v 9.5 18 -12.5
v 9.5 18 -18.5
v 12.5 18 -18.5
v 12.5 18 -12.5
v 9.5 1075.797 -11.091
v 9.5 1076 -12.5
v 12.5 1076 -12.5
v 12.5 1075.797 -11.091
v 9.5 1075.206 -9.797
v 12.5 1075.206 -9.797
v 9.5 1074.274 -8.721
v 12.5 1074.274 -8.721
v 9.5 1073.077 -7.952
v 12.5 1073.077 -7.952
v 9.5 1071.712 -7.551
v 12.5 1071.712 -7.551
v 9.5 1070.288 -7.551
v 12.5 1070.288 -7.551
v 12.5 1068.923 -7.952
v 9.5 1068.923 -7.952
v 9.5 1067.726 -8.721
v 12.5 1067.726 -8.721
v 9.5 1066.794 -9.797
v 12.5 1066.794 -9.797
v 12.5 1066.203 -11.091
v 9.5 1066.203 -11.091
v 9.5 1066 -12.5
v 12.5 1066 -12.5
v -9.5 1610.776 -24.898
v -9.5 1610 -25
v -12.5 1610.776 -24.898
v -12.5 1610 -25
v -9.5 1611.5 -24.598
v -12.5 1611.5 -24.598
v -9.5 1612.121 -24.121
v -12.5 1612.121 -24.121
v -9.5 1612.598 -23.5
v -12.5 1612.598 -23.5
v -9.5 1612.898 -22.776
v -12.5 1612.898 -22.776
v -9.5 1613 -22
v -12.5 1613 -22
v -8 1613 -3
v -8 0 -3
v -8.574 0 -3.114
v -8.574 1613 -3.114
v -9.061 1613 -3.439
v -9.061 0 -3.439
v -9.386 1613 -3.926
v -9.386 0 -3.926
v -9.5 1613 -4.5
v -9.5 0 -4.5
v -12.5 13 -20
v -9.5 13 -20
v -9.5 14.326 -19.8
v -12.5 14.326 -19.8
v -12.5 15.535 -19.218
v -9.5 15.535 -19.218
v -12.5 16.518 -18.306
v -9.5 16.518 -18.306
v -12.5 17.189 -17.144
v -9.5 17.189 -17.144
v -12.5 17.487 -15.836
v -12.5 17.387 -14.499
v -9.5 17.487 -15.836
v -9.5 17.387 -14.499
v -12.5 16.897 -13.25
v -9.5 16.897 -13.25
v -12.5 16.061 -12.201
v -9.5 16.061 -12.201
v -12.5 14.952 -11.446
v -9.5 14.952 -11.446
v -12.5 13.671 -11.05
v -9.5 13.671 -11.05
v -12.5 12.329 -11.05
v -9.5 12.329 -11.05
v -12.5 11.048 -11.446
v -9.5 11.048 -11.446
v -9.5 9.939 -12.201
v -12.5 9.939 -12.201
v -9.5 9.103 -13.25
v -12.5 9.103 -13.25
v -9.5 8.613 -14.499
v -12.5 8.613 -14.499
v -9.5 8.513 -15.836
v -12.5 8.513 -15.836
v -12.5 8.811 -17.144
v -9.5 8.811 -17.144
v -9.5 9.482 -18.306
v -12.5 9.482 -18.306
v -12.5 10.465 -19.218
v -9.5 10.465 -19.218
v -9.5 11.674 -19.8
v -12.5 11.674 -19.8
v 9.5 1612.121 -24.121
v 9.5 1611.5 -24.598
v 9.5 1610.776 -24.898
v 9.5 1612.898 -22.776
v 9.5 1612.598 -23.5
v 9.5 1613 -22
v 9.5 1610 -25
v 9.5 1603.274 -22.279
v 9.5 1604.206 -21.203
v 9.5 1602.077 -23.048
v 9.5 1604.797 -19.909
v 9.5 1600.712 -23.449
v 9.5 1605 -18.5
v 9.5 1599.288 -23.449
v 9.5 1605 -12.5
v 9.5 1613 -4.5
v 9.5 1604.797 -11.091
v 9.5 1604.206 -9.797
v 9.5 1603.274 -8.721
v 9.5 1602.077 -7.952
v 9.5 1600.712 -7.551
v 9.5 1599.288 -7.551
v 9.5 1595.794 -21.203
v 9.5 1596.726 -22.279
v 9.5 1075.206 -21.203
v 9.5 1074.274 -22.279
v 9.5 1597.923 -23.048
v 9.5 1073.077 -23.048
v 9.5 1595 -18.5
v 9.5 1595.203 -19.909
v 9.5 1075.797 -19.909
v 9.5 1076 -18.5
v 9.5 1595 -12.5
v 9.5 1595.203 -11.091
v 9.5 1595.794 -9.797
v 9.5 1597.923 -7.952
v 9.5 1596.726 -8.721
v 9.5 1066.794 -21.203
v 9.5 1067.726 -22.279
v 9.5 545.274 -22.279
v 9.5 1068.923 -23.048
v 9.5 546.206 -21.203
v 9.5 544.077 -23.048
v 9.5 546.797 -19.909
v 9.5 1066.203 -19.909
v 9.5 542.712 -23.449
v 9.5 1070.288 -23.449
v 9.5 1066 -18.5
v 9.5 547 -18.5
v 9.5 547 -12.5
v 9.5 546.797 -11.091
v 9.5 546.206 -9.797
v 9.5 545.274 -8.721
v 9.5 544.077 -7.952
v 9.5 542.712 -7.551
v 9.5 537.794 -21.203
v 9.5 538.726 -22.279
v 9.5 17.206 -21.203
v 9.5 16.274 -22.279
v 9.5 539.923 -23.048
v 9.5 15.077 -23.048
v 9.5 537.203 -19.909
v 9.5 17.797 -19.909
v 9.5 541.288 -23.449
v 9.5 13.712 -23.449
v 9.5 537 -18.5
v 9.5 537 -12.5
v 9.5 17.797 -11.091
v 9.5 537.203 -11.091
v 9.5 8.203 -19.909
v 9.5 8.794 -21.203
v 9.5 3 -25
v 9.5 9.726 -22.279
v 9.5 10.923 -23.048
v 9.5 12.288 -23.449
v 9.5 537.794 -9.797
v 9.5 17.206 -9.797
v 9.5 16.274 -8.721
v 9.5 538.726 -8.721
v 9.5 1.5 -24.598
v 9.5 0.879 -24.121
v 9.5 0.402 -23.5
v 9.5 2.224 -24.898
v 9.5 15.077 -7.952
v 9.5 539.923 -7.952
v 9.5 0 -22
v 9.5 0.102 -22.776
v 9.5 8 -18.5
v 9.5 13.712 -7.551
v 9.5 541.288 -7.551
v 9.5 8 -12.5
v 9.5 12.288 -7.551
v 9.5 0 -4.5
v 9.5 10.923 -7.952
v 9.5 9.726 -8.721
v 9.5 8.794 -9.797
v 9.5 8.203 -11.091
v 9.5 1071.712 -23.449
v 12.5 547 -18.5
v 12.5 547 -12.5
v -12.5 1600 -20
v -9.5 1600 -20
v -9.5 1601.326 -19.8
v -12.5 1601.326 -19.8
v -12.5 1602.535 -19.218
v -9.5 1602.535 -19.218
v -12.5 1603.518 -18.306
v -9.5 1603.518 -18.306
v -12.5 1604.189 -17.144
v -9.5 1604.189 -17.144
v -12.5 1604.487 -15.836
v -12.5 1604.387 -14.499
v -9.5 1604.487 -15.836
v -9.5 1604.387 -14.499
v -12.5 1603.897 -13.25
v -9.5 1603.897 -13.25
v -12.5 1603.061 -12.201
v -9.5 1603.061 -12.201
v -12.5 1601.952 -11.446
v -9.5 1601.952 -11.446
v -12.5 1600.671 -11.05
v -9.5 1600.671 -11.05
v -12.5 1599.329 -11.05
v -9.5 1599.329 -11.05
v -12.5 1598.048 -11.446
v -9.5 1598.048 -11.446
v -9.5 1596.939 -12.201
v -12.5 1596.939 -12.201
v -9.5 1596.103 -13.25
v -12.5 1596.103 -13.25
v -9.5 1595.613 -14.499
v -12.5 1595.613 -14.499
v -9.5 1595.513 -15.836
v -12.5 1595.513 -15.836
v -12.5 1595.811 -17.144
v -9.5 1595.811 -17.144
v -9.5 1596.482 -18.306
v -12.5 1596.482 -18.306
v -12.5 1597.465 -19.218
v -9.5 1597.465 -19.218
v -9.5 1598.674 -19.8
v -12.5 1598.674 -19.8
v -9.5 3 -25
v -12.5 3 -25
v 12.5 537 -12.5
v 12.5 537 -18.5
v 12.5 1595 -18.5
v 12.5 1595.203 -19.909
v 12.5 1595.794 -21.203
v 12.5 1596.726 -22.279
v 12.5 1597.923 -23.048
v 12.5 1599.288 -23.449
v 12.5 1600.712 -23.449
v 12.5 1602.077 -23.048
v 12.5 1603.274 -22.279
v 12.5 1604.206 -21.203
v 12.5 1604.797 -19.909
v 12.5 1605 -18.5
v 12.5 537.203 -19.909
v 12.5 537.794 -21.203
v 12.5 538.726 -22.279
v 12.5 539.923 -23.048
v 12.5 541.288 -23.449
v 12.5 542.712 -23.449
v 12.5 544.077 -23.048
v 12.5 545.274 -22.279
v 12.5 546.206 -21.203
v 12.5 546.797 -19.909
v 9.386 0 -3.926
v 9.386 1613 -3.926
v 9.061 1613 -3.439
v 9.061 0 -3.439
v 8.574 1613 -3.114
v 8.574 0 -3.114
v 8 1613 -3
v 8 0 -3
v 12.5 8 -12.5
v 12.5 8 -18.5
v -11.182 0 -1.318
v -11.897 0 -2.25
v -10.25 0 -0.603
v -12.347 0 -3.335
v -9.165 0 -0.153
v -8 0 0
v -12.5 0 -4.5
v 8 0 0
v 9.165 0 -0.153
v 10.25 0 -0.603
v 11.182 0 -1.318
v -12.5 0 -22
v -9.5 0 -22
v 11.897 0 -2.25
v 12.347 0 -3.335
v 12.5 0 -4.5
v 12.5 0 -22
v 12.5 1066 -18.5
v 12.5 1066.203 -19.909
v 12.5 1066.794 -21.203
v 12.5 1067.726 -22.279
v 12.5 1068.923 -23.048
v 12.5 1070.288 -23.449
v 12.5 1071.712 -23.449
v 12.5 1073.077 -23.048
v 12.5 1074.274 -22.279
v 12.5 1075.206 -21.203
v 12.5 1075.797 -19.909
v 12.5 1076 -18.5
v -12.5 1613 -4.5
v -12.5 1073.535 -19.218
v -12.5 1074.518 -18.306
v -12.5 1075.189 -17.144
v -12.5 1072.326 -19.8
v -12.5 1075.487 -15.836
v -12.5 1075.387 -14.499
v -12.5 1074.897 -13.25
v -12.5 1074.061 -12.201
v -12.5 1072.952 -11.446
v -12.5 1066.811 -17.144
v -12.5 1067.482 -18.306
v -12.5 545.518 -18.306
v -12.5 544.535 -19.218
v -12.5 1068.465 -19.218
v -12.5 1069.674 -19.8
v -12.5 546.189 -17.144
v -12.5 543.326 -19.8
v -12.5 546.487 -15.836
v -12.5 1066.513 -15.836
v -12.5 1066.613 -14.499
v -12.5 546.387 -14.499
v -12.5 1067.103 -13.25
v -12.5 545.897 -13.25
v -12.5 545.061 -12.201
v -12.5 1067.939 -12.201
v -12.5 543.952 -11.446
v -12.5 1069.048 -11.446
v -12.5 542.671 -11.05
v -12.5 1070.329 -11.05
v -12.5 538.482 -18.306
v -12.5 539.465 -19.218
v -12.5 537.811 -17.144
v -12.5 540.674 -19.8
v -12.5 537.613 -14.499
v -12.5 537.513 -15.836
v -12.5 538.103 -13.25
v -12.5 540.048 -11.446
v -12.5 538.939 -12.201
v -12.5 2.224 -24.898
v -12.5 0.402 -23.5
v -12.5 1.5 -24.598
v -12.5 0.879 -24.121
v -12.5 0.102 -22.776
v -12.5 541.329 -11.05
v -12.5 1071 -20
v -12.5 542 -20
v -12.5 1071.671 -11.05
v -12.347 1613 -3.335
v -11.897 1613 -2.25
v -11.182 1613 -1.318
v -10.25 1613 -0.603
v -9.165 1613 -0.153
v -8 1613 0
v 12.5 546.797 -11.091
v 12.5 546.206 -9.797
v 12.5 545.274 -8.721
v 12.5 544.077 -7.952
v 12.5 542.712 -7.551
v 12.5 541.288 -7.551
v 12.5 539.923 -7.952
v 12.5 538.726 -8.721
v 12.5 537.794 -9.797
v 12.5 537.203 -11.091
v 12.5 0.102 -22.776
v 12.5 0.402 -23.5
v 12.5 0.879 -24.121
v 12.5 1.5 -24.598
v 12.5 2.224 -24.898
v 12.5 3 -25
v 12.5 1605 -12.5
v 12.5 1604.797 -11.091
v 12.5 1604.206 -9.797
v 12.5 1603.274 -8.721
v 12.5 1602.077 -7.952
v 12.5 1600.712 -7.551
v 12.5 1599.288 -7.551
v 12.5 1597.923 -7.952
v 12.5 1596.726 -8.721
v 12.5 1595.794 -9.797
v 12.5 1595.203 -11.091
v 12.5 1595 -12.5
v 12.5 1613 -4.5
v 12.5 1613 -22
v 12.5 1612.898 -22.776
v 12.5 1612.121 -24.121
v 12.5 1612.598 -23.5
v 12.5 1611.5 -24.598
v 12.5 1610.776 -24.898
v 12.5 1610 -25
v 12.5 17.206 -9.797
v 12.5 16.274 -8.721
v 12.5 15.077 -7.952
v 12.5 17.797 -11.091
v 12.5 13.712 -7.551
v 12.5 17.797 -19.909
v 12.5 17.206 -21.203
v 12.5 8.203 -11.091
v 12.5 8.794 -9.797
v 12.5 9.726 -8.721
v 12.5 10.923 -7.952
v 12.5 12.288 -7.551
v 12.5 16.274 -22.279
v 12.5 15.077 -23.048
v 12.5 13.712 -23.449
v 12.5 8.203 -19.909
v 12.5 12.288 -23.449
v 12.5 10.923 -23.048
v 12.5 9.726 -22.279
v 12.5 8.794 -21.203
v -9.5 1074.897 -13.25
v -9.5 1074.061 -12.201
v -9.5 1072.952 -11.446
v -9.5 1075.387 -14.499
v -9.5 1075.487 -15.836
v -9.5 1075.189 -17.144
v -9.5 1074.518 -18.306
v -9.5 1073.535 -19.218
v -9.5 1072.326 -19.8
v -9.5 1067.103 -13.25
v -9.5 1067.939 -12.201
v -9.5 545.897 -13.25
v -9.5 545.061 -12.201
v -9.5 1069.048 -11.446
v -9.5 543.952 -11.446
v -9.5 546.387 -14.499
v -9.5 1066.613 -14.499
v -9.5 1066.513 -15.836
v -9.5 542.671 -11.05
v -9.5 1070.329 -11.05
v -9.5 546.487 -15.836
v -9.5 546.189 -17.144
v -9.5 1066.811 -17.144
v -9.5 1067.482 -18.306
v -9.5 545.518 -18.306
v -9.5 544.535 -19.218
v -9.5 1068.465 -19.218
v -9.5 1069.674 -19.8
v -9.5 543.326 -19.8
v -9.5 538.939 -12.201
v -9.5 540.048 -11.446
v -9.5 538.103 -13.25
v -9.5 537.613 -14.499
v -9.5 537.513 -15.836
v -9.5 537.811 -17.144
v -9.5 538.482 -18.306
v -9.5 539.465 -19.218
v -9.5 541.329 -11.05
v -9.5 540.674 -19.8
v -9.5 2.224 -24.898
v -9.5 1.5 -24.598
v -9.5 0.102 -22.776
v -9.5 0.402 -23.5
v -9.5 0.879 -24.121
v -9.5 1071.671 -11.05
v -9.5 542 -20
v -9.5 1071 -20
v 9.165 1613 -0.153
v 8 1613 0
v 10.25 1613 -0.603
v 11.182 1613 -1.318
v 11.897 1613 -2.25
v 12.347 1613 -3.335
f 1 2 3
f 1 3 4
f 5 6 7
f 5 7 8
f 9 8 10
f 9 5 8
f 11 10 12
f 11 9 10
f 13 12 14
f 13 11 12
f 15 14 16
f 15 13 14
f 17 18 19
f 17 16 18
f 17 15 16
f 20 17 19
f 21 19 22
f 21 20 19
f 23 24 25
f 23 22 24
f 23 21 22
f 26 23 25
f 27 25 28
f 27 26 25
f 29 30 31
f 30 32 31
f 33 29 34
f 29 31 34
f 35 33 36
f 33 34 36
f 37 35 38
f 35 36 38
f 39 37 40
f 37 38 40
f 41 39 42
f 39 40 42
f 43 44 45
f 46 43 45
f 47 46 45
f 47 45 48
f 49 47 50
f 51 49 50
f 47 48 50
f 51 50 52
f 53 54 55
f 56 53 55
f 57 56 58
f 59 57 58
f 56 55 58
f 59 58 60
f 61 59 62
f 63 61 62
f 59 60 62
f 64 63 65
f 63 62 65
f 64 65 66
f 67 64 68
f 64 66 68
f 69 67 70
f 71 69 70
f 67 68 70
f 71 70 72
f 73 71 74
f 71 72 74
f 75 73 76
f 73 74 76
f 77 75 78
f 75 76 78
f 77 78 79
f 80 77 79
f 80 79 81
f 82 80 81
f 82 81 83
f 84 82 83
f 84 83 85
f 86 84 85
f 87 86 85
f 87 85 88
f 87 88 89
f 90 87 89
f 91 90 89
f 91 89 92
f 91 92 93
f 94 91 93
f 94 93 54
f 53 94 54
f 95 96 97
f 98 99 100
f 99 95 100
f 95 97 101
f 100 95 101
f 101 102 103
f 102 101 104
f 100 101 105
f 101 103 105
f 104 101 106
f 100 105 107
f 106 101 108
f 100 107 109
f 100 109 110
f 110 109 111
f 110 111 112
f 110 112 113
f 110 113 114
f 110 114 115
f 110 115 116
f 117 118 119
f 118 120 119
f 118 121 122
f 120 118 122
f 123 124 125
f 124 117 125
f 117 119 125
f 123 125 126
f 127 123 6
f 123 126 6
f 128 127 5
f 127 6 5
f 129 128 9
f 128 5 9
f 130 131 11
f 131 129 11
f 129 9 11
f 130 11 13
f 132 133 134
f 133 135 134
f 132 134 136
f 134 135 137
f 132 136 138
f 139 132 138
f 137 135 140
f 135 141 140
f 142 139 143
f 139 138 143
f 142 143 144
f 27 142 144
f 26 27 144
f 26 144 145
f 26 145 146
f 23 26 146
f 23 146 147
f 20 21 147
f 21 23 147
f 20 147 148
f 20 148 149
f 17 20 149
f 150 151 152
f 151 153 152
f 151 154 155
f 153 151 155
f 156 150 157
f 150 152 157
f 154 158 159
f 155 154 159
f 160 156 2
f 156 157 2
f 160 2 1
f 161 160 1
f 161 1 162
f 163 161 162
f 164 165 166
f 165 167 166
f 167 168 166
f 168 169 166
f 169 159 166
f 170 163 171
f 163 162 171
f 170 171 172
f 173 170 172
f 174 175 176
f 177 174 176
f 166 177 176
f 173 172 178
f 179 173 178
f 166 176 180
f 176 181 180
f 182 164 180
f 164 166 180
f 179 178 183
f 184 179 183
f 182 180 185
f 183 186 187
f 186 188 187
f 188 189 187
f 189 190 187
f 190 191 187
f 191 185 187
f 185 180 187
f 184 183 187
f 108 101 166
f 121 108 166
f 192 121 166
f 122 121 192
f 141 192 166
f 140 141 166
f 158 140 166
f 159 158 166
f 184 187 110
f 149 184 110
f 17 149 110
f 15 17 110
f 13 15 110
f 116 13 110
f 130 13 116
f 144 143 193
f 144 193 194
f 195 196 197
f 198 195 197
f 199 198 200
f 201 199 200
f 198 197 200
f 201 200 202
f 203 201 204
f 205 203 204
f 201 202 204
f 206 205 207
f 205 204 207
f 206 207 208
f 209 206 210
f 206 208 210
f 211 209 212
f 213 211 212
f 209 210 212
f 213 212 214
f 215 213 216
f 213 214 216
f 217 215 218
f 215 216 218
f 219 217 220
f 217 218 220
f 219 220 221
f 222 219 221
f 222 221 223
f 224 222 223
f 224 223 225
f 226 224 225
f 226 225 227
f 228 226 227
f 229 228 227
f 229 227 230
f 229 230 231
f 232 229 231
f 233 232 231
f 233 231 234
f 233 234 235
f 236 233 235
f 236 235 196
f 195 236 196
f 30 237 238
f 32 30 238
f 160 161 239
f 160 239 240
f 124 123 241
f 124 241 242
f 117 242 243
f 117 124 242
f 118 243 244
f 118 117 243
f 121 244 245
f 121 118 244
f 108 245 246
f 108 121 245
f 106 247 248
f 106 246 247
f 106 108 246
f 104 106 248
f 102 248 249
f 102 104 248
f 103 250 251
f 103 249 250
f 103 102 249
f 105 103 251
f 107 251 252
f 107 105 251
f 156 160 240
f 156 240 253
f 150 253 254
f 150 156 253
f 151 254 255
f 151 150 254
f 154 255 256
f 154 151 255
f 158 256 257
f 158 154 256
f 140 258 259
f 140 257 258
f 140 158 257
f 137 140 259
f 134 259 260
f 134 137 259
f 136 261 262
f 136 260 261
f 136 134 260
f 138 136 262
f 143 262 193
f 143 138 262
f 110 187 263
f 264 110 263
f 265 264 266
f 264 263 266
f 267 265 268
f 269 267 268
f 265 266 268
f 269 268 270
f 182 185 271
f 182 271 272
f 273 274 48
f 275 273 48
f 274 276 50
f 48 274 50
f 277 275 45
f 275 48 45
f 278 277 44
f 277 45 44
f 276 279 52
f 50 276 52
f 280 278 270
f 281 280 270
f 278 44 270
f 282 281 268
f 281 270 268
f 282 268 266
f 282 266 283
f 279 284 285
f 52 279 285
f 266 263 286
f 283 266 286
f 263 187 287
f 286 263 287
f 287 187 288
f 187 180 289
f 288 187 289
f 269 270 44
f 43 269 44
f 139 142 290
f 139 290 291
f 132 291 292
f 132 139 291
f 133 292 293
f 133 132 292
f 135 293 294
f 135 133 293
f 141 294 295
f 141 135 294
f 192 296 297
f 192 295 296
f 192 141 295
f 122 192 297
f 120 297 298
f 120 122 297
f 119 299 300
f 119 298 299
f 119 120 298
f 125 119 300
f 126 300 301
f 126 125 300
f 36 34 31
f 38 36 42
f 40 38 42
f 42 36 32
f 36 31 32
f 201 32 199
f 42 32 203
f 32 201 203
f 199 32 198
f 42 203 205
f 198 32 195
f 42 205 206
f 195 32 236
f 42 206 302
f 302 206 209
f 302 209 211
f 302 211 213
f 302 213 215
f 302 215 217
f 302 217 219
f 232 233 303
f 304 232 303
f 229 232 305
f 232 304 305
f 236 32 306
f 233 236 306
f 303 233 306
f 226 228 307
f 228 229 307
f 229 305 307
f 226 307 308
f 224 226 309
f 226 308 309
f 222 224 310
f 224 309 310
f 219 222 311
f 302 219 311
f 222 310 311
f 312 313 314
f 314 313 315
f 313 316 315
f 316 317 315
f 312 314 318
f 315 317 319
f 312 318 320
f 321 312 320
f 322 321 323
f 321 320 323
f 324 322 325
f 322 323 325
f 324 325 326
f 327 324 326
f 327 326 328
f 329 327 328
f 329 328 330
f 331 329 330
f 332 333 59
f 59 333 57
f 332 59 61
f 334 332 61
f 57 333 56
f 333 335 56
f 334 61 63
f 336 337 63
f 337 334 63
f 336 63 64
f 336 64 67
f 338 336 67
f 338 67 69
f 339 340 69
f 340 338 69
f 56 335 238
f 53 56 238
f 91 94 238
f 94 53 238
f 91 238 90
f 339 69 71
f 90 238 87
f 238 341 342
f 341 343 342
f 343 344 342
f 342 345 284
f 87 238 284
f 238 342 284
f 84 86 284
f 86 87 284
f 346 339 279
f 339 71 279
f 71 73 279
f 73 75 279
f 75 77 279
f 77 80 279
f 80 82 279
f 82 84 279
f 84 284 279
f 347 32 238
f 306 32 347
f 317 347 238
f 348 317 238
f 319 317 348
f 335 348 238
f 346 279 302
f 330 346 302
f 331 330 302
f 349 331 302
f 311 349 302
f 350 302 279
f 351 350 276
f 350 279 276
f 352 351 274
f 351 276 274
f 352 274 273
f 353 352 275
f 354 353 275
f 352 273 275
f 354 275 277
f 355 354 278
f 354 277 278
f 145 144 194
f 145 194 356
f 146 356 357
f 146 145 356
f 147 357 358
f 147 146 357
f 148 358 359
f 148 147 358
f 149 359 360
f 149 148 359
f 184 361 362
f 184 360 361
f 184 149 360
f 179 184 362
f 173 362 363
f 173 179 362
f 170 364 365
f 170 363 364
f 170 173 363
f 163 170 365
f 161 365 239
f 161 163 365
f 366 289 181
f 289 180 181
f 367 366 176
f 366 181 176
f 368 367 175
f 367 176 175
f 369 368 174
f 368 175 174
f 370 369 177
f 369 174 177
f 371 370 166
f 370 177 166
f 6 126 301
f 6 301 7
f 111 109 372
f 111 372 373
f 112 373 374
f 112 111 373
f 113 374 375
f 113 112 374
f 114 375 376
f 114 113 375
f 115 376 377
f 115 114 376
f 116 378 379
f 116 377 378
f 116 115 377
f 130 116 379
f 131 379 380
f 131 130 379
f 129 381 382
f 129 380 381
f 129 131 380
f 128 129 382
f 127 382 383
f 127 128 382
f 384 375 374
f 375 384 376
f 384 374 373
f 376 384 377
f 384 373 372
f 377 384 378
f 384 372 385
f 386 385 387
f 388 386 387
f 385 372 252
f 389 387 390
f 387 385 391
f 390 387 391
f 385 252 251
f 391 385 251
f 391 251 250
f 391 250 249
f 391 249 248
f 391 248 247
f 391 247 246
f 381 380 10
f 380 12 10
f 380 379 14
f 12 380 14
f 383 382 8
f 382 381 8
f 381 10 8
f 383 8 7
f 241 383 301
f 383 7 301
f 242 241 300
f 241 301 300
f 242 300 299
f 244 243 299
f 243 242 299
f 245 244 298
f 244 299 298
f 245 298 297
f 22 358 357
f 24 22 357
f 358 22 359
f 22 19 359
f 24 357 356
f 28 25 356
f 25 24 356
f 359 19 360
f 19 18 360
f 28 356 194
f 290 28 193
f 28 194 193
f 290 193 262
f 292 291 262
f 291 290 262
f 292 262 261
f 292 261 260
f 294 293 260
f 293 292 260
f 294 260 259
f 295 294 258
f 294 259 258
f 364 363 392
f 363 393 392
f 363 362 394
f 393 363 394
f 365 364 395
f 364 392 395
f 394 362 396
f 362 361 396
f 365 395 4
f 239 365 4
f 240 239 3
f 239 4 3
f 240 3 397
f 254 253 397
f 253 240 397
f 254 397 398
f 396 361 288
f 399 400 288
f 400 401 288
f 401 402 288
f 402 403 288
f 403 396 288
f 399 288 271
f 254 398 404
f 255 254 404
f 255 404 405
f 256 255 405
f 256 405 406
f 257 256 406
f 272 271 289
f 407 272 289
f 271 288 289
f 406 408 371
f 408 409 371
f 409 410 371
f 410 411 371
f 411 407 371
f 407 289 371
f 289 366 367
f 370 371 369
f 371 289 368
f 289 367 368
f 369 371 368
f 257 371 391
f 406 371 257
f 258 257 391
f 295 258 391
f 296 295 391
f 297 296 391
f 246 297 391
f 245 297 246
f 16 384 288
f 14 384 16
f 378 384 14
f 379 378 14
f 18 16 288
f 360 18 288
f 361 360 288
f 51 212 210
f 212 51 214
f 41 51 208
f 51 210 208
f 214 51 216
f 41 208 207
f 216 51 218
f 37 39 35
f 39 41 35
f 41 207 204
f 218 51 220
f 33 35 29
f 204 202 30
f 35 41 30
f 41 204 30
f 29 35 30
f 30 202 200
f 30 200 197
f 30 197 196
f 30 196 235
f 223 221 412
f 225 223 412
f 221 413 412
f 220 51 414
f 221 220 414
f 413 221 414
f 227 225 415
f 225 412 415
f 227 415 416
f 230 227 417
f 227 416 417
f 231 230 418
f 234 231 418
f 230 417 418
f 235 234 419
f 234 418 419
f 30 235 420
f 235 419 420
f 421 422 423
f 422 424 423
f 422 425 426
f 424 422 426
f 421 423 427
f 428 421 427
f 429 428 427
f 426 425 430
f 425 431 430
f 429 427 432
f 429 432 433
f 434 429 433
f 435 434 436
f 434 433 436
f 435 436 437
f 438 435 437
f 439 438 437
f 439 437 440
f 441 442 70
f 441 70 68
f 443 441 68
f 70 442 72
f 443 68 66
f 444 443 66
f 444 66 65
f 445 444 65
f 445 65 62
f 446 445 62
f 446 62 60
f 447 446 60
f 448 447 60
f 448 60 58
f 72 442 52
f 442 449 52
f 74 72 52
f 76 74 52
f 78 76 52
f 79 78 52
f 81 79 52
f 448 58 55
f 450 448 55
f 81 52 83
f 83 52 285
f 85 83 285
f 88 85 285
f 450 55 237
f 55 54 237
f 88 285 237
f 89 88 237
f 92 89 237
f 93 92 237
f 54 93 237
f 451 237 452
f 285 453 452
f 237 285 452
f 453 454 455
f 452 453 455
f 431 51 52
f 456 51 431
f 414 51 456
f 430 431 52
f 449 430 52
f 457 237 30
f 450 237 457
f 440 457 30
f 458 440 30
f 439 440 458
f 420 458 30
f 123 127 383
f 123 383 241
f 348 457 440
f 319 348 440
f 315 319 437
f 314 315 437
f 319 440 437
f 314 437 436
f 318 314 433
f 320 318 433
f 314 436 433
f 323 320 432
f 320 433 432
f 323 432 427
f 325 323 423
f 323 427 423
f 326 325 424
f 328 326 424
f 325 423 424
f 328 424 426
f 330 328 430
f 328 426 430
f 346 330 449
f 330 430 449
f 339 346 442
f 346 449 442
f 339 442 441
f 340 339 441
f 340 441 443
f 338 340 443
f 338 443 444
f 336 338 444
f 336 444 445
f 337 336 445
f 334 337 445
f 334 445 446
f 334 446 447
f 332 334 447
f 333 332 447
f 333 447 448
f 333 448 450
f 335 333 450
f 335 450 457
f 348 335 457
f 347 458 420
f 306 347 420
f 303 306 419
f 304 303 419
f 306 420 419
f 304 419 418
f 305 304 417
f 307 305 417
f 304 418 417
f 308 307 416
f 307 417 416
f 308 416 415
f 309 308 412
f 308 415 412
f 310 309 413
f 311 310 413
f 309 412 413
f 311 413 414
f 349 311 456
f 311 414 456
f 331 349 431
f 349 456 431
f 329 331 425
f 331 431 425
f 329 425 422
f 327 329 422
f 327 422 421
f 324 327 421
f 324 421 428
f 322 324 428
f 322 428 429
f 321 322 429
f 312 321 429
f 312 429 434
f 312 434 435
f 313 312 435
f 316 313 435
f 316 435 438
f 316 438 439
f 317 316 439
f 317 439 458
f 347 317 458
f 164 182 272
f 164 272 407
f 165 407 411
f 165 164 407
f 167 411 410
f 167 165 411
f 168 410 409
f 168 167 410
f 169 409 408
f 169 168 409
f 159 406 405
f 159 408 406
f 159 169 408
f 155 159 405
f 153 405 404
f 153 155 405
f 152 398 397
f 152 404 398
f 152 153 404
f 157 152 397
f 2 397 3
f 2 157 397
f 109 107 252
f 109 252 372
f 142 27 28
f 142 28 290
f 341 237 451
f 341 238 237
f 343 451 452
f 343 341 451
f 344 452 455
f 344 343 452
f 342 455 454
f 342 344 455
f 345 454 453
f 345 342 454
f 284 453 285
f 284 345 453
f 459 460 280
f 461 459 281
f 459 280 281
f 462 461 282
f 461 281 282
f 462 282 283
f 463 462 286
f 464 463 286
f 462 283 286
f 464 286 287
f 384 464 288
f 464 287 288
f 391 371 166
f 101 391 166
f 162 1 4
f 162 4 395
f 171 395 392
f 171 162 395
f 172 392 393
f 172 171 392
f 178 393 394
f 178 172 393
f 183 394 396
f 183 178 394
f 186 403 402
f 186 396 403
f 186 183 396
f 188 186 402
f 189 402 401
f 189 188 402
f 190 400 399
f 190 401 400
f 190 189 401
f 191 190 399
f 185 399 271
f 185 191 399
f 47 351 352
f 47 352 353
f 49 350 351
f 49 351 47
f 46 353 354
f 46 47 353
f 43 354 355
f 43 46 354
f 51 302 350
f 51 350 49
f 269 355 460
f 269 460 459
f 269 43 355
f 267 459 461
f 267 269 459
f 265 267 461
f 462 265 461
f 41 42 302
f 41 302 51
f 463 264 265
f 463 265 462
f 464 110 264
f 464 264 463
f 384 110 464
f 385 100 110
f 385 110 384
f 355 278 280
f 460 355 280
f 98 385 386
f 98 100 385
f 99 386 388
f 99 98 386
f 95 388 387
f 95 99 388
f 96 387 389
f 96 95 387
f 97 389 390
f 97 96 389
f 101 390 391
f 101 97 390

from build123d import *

# Parameters (mm, degrees)
BASE_FLANGE1_DEPTH = 1613
CUT_EXTRUDE1_REACH = 1615.344
SKETCH6_R          = 4.5
FILLET1_R          = 3
CUT_EXTRUDE2_REACH = 1615.344
LPATTERN1_COUNT    = 4
LPATTERN1_PITCH    = 529


# Sheet-metal steps are written as plain solids
with BuildPart() as part:
    # Sketch1 → Base-Flange1 (new body)
    with BuildSketch(Plane(origin=(0, 0, 0), x_dir=(1, 0, 0), z_dir=(0, 1, 0))):
        with BuildLine():
            Line((-12.5, 25), (-12.5, 4.5))
            ThreePointArc((-12.5, 4.5), (-11.181980515, 1.318019485), (-8, 0))
            Line((-8, 0), (8, 0))
            ThreePointArc((8, 0), (11.181980515, 1.318019485), (12.5, 4.5))
            Line((12.5, 4.5), (12.5, 25))
            Line((12.5, 25), (9.5, 25))
            Line((9.5, 25), (9.5, 4.5))
            ThreePointArc((9.5, 4.5), (9.060660172, 3.439339828), (8, 3))
            Line((8, 3), (-8, 3))
            ThreePointArc((-8, 3), (-9.060660172, 3.439339828), (-9.5, 4.5))
            Line((-9.5, 4.5), (-9.5, 25))
            Line((-9.5, 25), (-12.5, 25))
        make_face()
    extrude(amount=BASE_FLANGE1_DEPTH)

    # Sketch6 → Cut-Extrude1 (cut, up to next)
    with BuildSketch(Plane(origin=(-9.5, 0, 0), x_dir=(0, 0, -1), z_dir=(1, 0, 0)), mode=Mode.PRIVATE) as cut_extrude1_sk1:
        with Locations((15.5, 13)):
            Circle(SKETCH6_R)
    cut_extrude1_tool1 = extrude(cut_extrude1_sk1.sketch, amount=-CUT_EXTRUDE1_REACH, mode=Mode.PRIVATE) & part.part
    cut_extrude1 = cut_extrude1_tool1.solids().sort_by_distance((-9.5, 13, -15.5))[0]
    add(cut_extrude1, mode=Mode.SUBTRACT)

    # Fillet1
    fillet1_edges = [part.edges().sort_by_distance(p)[0] for p in [
        (11, 0, -25),
        (-11, 0, -25),
        (11, 1613, -25),
        (-11, 1613, -25),
    ]]
    fillet(fillet1_edges, radius=FILLET1_R)

    # Sketch7 → Cut-Extrude2 (cut, up to next)
    with BuildSketch(Plane.ZY.offset(-9.5), mode=Mode.PRIVATE) as cut_extrude2_sk1:
        with BuildLine():
            Line((-18.5, 18), (-12.5, 18))
            ThreePointArc((-12.5, 18), (-7.5, 13), (-12.5, 8))
            Line((-12.5, 8), (-18.5, 8))
            ThreePointArc((-18.5, 8), (-23.5, 13), (-18.5, 18))
        make_face()
    cut_extrude2_tool1 = extrude(cut_extrude2_sk1.sketch, amount=-CUT_EXTRUDE2_REACH, mode=Mode.PRIVATE) & part.part
    cut_extrude2 = cut_extrude2_tool1.solids().sort_by_distance((9.5, 13, -15.5))[0]
    add(cut_extrude2, mode=Mode.SUBTRACT)

    # LPattern1: Cut-Extrude1, Cut-Extrude2 ×4
    with Locations(*[(0, i * LPATTERN1_PITCH, 0) for i in range(1, LPATTERN1_COUNT)]):
        add(cut_extrude1, mode=Mode.SUBTRACT)
        add(cut_extrude2, mode=Mode.SUBTRACT)


solid = part.part
